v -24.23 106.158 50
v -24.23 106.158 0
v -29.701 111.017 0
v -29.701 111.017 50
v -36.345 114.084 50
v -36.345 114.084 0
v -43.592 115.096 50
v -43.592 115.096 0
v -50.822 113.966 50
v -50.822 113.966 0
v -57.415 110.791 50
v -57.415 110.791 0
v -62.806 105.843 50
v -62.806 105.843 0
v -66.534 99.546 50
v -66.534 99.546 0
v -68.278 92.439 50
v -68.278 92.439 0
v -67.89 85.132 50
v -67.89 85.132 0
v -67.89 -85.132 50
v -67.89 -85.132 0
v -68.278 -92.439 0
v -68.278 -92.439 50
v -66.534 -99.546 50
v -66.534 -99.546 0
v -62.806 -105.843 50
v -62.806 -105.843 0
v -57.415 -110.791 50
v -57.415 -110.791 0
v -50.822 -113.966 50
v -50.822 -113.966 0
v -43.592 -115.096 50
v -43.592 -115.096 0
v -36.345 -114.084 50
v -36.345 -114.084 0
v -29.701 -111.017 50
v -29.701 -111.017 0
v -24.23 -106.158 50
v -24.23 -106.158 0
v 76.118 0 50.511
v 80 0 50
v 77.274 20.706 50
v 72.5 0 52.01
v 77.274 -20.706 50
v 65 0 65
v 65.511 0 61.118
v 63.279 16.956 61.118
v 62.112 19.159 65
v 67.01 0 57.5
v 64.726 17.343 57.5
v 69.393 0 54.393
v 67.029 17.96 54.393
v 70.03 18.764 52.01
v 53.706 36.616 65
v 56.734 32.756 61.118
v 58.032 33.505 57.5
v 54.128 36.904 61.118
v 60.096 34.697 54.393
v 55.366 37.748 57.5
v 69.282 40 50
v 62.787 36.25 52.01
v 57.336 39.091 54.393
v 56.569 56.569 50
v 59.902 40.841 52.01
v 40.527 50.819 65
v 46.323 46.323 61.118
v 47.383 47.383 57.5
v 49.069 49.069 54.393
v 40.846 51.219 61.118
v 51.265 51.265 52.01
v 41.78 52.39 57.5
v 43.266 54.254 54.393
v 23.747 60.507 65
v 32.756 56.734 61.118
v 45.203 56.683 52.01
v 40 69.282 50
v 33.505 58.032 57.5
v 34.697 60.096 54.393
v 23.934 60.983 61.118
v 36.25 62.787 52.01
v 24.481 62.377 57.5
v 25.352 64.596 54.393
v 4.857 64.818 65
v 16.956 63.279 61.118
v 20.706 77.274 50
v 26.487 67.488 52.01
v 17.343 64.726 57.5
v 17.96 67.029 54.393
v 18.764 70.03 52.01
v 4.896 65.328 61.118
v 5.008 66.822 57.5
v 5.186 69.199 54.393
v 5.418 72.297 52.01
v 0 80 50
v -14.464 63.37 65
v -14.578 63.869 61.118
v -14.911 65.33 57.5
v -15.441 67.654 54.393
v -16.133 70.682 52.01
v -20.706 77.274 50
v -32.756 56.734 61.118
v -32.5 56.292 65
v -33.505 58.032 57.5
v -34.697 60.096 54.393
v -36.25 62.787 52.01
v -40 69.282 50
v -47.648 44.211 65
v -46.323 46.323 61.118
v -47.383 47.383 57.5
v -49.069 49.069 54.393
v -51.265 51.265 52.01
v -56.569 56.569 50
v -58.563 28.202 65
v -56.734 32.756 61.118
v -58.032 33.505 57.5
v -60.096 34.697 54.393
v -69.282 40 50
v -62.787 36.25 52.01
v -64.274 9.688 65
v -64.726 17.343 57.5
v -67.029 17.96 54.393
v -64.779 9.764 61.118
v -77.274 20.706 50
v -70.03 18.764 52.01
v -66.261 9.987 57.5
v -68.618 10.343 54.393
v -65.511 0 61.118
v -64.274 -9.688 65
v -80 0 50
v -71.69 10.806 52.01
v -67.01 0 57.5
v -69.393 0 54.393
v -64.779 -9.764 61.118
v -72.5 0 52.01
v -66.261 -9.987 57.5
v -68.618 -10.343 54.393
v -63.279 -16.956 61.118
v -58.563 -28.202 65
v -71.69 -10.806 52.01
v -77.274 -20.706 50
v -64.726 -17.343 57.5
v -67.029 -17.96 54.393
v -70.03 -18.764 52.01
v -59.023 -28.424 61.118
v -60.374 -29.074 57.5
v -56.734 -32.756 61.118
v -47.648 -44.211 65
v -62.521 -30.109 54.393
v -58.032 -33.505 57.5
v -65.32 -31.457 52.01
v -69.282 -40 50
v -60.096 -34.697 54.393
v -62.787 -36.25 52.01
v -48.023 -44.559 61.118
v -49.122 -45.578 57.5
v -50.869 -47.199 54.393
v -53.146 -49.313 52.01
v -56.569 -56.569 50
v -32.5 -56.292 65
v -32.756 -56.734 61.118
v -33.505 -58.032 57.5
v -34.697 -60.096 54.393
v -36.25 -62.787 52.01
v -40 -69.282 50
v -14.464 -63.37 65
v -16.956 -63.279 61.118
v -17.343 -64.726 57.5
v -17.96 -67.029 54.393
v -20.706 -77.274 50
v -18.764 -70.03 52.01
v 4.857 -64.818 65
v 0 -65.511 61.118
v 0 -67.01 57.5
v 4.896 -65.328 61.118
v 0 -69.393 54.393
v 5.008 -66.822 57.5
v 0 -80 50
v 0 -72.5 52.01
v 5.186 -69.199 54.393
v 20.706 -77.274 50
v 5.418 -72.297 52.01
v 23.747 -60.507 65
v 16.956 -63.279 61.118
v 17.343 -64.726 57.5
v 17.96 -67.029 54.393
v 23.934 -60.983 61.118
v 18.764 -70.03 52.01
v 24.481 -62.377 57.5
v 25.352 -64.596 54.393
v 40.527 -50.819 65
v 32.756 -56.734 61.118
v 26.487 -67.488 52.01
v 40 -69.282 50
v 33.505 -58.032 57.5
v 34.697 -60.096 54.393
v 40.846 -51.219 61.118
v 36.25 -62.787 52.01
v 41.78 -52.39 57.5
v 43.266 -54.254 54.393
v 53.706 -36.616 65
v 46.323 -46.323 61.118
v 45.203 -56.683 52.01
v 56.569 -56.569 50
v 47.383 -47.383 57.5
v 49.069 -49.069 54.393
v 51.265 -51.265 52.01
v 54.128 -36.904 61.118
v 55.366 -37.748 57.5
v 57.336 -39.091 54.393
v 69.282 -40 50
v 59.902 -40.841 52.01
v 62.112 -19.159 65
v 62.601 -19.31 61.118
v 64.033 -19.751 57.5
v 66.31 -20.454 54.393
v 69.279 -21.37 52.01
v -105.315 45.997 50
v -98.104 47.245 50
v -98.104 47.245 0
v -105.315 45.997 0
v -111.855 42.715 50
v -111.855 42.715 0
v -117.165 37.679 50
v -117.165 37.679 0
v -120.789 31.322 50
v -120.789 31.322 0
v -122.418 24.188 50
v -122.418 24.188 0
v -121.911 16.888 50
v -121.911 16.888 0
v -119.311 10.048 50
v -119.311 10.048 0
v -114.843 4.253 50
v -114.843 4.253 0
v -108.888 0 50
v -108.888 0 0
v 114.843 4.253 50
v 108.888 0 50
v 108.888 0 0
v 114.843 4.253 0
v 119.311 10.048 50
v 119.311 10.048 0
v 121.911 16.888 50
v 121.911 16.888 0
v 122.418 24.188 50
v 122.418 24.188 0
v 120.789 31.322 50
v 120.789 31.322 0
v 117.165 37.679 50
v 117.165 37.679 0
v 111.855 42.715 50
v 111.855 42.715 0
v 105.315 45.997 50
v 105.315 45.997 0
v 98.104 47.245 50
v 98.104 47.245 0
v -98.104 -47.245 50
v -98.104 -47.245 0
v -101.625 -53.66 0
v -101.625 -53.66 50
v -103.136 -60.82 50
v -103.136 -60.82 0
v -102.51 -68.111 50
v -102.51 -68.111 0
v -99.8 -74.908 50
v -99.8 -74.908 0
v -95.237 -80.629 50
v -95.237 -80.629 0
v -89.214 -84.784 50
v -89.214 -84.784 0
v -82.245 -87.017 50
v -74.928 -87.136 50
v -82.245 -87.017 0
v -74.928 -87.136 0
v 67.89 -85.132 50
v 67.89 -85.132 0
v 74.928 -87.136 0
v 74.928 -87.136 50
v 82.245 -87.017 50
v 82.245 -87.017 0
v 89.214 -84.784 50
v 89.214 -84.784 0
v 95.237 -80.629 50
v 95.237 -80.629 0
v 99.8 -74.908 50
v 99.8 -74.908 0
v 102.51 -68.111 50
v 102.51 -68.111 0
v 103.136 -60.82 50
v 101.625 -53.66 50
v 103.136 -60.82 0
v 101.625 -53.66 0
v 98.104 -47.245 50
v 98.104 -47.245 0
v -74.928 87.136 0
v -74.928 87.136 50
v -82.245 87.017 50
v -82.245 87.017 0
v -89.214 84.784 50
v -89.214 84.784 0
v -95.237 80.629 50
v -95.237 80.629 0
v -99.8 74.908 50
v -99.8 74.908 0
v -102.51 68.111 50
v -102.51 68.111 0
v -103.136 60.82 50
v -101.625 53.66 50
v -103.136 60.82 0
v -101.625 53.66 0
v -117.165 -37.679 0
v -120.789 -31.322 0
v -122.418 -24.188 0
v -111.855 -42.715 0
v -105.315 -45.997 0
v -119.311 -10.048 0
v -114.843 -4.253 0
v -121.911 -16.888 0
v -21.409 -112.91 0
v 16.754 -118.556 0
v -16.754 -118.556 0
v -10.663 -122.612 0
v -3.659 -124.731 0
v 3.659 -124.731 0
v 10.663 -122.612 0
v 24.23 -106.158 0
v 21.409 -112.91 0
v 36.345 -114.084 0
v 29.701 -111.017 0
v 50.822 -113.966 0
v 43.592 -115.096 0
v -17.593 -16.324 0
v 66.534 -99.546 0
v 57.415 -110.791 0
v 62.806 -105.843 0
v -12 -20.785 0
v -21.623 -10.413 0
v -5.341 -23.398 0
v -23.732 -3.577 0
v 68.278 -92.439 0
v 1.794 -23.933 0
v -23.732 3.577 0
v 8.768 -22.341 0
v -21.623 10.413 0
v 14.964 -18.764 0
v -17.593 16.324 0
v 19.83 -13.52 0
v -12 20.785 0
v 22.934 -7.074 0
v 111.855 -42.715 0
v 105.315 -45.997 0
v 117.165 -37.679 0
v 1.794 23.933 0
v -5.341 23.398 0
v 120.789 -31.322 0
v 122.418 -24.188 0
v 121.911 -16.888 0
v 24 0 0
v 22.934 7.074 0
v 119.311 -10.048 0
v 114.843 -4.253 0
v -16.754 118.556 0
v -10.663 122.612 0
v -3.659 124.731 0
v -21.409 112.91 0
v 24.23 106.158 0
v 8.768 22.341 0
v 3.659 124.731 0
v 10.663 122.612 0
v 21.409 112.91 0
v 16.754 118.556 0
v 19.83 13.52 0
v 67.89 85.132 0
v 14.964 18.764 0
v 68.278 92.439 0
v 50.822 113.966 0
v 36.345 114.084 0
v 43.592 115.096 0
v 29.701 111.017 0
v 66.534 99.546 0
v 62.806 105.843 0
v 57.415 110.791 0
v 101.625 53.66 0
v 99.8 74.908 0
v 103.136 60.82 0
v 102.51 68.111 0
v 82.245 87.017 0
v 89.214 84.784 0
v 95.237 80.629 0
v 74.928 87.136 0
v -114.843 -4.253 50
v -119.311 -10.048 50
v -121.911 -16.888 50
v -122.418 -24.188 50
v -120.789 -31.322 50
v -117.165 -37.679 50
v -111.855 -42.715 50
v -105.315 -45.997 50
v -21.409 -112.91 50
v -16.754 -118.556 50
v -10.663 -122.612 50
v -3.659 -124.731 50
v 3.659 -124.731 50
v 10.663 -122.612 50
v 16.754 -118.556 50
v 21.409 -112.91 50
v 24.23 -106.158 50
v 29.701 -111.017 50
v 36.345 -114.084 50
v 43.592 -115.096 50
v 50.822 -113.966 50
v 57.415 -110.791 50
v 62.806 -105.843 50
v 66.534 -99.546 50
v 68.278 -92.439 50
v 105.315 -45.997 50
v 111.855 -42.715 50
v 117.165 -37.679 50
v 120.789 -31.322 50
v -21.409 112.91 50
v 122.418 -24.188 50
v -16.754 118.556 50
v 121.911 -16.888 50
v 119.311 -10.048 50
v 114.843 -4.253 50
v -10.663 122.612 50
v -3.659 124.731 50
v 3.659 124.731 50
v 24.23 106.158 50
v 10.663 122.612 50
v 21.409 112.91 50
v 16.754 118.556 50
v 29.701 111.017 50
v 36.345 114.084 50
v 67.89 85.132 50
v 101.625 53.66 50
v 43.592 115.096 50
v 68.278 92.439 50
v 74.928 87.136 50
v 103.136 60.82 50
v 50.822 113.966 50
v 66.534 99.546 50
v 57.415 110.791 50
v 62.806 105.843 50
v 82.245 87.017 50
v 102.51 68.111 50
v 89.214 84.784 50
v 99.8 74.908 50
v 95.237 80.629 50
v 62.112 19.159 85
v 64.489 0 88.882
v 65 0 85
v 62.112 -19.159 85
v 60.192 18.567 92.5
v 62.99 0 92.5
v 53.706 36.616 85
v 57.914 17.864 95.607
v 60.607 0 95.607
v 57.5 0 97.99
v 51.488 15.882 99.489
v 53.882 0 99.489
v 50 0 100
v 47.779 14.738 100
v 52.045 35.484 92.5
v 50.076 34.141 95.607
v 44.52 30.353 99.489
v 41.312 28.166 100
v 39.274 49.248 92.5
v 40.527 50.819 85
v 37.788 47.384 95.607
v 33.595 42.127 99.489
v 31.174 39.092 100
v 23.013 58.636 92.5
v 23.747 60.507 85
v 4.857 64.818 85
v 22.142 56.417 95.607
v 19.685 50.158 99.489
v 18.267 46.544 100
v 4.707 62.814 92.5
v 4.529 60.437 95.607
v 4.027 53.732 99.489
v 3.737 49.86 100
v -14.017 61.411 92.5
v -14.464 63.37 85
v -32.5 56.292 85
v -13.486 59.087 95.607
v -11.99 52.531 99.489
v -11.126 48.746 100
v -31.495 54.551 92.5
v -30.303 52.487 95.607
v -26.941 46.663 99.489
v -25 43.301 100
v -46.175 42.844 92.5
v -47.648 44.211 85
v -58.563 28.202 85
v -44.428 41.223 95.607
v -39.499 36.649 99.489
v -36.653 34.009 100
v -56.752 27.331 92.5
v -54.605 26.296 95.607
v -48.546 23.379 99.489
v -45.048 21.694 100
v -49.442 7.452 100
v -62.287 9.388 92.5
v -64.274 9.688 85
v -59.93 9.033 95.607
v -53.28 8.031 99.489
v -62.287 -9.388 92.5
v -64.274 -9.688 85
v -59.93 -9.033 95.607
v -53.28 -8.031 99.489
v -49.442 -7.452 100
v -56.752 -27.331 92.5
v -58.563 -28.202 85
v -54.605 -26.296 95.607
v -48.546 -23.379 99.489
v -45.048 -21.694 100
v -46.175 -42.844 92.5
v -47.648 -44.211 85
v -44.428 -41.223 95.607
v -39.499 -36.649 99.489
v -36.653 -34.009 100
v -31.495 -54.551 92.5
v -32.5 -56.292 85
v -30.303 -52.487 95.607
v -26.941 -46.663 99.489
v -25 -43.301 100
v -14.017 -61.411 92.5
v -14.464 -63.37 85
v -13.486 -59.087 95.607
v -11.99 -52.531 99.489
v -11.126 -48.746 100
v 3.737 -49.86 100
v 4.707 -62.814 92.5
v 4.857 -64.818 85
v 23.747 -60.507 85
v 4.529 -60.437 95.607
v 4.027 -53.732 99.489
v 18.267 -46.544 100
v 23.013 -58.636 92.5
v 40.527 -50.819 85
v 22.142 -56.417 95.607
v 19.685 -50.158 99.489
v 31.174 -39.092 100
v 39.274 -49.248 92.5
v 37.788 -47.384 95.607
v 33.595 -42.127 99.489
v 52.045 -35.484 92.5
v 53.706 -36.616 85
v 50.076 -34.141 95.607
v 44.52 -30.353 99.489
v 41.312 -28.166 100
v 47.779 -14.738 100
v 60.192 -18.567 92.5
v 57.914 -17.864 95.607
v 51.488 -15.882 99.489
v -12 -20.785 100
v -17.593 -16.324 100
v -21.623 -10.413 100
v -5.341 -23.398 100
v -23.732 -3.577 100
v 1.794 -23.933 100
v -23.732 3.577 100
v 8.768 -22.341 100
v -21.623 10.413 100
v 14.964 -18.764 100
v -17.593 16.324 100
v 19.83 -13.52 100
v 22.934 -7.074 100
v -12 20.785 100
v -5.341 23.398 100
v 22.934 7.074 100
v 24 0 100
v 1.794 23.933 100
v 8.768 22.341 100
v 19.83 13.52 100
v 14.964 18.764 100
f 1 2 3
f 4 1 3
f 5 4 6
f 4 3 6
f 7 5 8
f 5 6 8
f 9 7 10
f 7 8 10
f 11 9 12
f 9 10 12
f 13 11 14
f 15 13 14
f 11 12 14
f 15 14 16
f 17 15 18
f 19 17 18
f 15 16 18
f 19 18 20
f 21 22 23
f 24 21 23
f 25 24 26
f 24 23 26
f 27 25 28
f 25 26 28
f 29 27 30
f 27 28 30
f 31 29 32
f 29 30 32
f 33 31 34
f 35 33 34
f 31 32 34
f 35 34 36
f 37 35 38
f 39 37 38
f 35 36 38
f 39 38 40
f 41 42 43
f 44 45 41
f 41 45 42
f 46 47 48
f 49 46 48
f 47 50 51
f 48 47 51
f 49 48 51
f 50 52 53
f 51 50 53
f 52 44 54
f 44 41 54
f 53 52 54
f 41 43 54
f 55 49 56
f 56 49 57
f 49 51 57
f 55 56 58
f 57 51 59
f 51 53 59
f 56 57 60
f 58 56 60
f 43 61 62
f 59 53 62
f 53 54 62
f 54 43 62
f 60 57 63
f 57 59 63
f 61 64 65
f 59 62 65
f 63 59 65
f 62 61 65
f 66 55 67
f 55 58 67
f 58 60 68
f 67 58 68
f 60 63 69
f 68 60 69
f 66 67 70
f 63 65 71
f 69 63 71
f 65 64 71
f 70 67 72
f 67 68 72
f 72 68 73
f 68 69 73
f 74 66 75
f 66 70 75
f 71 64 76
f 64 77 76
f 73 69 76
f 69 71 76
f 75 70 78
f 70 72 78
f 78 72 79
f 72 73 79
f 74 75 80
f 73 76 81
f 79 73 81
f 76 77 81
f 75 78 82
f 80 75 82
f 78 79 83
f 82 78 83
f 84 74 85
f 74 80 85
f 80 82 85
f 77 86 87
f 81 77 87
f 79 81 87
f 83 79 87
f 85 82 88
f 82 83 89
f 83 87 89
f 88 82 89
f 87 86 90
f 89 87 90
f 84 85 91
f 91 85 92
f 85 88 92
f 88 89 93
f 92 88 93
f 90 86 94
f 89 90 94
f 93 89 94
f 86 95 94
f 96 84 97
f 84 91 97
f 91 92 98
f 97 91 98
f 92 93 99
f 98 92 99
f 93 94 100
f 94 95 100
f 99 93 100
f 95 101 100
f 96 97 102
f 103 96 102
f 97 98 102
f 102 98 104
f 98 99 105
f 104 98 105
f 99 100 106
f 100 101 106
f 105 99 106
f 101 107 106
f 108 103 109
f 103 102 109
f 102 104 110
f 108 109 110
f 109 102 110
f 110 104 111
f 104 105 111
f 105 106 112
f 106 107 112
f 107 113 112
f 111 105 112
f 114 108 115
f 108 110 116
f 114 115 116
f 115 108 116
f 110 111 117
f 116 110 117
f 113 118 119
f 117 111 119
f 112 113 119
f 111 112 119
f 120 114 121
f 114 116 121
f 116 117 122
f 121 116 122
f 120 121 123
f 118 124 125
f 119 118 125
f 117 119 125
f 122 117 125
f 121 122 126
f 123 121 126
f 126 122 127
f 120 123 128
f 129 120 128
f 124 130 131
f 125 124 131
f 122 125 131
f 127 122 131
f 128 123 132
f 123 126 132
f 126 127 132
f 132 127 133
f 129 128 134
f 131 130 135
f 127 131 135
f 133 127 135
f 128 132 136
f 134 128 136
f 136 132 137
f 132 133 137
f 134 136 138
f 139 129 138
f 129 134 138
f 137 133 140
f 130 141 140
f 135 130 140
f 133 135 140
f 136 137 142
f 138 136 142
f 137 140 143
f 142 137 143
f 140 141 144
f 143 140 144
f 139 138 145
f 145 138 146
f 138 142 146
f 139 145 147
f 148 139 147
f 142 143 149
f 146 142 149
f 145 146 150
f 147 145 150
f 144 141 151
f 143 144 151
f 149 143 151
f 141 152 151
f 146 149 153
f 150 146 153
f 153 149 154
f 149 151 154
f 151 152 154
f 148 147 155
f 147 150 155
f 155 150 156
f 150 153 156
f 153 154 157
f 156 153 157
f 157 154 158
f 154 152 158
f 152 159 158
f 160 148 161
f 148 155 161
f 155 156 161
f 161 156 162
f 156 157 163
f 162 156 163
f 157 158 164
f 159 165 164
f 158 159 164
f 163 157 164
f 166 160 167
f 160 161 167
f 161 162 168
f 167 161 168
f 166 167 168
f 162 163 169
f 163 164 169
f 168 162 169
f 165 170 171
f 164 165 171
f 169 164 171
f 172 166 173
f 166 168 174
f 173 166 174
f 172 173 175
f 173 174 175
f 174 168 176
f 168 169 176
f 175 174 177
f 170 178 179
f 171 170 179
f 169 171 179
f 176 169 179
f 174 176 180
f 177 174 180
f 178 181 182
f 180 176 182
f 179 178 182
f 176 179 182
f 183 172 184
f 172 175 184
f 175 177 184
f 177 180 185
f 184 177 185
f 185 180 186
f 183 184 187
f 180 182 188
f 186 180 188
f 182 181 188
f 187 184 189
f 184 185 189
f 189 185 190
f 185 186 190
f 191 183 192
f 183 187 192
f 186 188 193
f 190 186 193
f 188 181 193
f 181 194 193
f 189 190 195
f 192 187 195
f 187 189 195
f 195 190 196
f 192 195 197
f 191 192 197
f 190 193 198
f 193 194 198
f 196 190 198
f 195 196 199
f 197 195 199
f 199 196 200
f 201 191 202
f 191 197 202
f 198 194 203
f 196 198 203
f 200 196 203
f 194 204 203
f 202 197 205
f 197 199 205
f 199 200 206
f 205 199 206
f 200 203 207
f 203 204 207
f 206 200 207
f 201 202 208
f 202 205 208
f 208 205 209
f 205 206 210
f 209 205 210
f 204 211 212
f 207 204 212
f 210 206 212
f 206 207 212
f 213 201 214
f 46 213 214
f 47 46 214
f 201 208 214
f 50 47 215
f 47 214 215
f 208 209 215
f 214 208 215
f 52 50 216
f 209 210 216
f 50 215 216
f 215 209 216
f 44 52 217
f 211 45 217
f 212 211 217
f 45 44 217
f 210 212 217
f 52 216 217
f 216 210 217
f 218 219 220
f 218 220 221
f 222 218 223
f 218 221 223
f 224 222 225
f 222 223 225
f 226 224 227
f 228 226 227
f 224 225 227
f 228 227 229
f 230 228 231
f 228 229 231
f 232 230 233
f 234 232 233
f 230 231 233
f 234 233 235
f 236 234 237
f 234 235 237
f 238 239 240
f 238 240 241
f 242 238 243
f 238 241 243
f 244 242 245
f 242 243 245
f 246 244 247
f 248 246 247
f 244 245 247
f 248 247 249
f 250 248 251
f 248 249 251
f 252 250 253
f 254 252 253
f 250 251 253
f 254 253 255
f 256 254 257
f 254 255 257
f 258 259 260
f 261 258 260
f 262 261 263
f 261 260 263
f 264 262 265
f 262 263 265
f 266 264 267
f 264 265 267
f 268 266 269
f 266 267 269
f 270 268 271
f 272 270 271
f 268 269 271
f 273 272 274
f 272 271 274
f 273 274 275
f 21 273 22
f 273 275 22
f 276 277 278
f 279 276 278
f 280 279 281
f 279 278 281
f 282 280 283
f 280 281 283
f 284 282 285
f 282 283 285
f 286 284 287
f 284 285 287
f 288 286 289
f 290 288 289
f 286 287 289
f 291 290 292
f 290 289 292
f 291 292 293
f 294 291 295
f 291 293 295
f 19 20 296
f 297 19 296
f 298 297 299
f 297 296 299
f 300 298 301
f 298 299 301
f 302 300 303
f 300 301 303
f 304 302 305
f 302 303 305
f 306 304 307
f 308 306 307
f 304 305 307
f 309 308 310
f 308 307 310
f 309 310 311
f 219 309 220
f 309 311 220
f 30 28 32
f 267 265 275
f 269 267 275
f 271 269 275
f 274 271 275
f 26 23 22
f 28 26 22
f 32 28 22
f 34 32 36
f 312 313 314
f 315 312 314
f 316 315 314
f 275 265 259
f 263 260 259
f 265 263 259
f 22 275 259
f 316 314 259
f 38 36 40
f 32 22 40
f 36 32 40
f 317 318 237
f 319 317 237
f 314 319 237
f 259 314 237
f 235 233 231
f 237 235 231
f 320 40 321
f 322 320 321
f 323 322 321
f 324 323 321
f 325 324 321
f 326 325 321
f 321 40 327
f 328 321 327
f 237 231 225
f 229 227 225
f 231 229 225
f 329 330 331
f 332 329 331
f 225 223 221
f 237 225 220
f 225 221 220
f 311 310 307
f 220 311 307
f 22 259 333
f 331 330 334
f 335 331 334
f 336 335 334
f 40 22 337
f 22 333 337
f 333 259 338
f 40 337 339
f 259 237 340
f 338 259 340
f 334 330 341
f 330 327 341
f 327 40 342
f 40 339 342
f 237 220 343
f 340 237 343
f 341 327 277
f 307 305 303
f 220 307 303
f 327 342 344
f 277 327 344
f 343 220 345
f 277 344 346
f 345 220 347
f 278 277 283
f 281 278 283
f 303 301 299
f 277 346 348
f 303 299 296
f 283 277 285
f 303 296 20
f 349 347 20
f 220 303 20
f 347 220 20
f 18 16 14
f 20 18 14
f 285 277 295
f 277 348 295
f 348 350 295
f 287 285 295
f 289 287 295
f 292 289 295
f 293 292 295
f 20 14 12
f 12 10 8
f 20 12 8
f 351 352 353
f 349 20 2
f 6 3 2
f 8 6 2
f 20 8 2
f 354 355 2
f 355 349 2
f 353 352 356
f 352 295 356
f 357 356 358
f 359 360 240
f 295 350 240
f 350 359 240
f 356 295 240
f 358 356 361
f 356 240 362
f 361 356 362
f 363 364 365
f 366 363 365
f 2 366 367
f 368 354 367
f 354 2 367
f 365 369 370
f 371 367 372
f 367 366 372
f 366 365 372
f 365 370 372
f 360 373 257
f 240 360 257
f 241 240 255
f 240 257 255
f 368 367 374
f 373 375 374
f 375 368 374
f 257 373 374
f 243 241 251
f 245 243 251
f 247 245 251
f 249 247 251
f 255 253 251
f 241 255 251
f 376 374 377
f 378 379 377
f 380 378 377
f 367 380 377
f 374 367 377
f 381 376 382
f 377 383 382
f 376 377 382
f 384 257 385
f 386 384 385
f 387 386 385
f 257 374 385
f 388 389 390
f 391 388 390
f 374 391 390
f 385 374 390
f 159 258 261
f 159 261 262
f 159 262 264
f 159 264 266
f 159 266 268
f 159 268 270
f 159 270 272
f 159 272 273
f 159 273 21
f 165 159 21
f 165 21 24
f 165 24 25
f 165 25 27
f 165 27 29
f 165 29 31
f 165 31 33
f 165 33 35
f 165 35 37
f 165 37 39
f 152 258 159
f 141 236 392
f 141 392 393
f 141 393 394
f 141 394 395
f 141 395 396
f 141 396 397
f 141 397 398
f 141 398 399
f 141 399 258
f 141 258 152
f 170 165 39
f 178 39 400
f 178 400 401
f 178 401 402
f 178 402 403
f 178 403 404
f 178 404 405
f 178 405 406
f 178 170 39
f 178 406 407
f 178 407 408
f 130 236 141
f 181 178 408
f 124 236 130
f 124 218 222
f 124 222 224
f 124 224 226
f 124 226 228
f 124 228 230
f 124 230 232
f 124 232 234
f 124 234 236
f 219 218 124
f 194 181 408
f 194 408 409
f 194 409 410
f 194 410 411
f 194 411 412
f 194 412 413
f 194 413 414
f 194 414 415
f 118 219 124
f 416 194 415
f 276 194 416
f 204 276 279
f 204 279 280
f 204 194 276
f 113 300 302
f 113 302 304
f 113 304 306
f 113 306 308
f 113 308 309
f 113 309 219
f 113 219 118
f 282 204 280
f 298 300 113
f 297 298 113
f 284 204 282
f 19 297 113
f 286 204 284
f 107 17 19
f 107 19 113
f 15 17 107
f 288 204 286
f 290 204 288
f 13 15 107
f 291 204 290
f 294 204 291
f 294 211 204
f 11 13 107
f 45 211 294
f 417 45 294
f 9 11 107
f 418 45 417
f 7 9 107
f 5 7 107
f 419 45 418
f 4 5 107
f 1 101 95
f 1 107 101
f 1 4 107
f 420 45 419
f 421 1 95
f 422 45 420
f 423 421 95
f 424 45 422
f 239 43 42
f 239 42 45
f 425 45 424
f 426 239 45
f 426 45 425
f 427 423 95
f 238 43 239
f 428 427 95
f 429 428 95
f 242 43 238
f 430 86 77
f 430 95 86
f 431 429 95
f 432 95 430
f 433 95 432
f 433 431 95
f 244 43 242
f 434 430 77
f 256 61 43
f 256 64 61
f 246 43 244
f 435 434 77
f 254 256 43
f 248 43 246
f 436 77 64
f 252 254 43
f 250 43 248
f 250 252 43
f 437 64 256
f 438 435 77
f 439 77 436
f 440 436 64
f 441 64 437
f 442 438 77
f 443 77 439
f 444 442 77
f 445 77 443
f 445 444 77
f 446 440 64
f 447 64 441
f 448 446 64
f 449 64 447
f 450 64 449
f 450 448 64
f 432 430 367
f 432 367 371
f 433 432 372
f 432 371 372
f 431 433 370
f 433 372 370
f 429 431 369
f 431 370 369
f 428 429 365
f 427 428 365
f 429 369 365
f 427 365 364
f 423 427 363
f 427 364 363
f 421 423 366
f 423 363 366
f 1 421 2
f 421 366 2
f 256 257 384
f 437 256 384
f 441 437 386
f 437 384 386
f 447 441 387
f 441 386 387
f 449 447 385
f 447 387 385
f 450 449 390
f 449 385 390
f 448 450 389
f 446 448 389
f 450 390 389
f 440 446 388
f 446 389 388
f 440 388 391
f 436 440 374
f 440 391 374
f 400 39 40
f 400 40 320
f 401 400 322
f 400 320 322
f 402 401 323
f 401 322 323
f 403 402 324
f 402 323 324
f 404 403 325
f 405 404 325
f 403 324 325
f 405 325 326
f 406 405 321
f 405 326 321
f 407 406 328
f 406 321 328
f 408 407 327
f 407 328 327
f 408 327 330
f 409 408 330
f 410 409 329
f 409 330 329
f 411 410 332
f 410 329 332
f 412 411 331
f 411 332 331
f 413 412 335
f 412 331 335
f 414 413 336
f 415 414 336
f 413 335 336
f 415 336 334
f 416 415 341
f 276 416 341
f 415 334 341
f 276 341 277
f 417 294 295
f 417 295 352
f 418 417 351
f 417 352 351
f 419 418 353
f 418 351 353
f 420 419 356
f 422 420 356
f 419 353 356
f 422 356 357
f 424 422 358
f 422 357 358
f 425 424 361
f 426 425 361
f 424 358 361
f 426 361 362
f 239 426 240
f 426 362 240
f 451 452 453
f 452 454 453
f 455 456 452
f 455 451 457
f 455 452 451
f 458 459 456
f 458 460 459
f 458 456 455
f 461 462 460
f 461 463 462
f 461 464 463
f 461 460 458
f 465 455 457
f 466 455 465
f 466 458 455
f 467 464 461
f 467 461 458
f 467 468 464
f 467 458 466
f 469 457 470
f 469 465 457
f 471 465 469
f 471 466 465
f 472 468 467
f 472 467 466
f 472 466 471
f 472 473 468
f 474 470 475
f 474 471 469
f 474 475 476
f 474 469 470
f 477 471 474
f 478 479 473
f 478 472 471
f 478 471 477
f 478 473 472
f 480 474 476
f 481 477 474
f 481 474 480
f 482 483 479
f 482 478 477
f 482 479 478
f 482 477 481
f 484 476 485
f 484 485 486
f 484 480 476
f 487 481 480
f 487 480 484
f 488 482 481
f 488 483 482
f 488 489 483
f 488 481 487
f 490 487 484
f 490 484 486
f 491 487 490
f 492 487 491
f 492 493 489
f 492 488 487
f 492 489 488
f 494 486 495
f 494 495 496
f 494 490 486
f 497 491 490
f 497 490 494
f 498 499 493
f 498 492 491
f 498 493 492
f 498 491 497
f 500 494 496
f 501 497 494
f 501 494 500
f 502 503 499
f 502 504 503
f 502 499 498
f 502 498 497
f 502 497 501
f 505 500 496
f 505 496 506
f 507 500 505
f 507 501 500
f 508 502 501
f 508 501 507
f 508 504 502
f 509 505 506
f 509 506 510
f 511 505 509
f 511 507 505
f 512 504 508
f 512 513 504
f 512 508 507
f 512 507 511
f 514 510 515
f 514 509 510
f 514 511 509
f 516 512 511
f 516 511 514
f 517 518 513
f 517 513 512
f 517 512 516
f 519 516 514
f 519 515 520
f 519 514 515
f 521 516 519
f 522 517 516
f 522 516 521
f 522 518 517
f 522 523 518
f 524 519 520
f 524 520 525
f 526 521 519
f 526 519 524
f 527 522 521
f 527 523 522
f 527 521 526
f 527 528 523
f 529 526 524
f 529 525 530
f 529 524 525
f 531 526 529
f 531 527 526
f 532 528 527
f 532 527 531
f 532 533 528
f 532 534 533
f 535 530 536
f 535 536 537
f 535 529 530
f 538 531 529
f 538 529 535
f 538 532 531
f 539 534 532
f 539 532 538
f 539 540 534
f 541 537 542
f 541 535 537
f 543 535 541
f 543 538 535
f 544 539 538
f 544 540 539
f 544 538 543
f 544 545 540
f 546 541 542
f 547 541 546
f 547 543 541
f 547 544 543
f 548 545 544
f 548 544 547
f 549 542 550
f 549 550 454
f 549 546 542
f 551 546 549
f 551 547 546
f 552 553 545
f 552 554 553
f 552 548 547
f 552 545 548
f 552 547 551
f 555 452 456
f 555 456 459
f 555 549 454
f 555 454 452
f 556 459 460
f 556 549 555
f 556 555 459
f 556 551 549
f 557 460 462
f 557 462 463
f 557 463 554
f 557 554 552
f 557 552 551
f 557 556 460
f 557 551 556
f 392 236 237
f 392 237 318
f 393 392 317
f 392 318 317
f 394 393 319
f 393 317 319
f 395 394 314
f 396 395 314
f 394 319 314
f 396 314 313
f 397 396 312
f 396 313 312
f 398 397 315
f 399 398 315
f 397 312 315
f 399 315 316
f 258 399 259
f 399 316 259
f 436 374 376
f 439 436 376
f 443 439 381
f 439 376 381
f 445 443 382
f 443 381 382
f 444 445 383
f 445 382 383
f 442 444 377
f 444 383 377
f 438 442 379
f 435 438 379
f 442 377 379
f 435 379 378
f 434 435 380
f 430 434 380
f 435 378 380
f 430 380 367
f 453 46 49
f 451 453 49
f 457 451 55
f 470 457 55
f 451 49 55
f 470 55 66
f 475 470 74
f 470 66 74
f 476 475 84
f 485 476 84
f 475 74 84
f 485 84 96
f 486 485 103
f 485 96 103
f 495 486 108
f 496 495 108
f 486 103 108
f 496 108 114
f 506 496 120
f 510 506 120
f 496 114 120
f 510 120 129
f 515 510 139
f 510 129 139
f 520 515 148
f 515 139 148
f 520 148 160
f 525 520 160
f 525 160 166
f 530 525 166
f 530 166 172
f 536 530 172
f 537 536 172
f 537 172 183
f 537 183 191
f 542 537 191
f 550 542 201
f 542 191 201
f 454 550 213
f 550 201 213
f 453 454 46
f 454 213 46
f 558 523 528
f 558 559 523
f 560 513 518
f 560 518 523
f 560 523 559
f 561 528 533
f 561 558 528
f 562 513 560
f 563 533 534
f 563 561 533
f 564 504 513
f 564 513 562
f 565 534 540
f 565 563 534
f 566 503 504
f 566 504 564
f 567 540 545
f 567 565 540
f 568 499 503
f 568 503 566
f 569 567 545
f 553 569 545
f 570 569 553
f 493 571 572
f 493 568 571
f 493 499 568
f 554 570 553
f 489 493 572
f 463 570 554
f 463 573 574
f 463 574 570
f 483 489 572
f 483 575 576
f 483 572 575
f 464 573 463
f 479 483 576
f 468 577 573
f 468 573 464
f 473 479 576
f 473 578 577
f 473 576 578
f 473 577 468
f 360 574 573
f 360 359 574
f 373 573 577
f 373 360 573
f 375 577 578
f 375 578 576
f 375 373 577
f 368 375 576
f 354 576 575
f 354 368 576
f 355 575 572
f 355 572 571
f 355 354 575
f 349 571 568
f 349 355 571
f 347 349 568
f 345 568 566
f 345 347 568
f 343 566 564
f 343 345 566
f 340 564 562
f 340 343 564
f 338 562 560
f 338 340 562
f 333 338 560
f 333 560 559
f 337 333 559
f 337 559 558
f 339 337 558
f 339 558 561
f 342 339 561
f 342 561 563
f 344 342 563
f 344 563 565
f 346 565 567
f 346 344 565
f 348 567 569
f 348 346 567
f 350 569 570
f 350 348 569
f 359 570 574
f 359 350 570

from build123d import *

# Parameters (mm, degrees)
F0_R     = 24
F1_DEPTH = 50
F2_R     = 65
F2_R_2   = 24
F3_DEPTH = 50
F4_R     = 15


with BuildPart() as f1:
    # F0 (on Top) → F1 (new body)
    with BuildSketch(Plane.XY):
        with BuildLine():
            ThreePointArc((67.890381, 85.131845), (54.235467, 112.621108), (24.229797, 106.157675))
            ThreePointArc((24.229797, 106.157675), (0, 125), (-24.229797, 106.157675))
            ThreePointArc((-24.229797, 106.157675), (-54.235467, 112.621108), (-67.890381, 85.131845))
            ThreePointArc((-67.890381, 85.131845), (-97.728935, 77.936225), (-98.104443, 47.24461))
            ThreePointArc((-98.104443, 47.24461), (-121.865989, 27.815117), (-108.887717, 0))
            ThreePointArc((-108.887717, 0), (-121.865989, -27.815117), (-98.104443, -47.24461))
            ThreePointArc((-98.104443, -47.24461), (-97.728935, -77.936225), (-67.890381, -85.131845))
            ThreePointArc((-67.890381, -85.131845), (-54.235467, -112.621108), (-24.229797, -106.157675))
            ThreePointArc((-24.229797, -106.157675), (0, -125), (24.229797, -106.157675))
            ThreePointArc((24.229797, -106.157675), (54.235467, -112.621108), (67.890381, -85.131845))
            ThreePointArc((67.890381, -85.131845), (97.728935, -77.936225), (98.104443, -47.24461))
            ThreePointArc((98.104443, -47.24461), (121.865989, -27.815117), (108.887717, 0))
            ThreePointArc((108.887717, 0), (121.865989, 27.815117), (98.104443, 47.24461))
            ThreePointArc((98.104443, 47.24461), (97.728935, 77.936225), (67.890381, 85.131845))
        make_face()
        Circle(F0_R, mode=Mode.SUBTRACT)
    extrude(amount=F1_DEPTH)

    # F2 (on face) → F3 (join)
    with BuildSketch(Plane.XY.offset(50)):
        Circle(F2_R)
        Circle(F2_R_2, mode=Mode.SUBTRACT)
    extrude(amount=F3_DEPTH)

    # F4
    f4_edges = [f1.edges().sort_by_distance(p)[0] for p in [
        (-65, 0, 50),
        (-65, 0, 100),
    ]]
    fillet(f4_edges, radius=F4_R)


solid = f1.part
